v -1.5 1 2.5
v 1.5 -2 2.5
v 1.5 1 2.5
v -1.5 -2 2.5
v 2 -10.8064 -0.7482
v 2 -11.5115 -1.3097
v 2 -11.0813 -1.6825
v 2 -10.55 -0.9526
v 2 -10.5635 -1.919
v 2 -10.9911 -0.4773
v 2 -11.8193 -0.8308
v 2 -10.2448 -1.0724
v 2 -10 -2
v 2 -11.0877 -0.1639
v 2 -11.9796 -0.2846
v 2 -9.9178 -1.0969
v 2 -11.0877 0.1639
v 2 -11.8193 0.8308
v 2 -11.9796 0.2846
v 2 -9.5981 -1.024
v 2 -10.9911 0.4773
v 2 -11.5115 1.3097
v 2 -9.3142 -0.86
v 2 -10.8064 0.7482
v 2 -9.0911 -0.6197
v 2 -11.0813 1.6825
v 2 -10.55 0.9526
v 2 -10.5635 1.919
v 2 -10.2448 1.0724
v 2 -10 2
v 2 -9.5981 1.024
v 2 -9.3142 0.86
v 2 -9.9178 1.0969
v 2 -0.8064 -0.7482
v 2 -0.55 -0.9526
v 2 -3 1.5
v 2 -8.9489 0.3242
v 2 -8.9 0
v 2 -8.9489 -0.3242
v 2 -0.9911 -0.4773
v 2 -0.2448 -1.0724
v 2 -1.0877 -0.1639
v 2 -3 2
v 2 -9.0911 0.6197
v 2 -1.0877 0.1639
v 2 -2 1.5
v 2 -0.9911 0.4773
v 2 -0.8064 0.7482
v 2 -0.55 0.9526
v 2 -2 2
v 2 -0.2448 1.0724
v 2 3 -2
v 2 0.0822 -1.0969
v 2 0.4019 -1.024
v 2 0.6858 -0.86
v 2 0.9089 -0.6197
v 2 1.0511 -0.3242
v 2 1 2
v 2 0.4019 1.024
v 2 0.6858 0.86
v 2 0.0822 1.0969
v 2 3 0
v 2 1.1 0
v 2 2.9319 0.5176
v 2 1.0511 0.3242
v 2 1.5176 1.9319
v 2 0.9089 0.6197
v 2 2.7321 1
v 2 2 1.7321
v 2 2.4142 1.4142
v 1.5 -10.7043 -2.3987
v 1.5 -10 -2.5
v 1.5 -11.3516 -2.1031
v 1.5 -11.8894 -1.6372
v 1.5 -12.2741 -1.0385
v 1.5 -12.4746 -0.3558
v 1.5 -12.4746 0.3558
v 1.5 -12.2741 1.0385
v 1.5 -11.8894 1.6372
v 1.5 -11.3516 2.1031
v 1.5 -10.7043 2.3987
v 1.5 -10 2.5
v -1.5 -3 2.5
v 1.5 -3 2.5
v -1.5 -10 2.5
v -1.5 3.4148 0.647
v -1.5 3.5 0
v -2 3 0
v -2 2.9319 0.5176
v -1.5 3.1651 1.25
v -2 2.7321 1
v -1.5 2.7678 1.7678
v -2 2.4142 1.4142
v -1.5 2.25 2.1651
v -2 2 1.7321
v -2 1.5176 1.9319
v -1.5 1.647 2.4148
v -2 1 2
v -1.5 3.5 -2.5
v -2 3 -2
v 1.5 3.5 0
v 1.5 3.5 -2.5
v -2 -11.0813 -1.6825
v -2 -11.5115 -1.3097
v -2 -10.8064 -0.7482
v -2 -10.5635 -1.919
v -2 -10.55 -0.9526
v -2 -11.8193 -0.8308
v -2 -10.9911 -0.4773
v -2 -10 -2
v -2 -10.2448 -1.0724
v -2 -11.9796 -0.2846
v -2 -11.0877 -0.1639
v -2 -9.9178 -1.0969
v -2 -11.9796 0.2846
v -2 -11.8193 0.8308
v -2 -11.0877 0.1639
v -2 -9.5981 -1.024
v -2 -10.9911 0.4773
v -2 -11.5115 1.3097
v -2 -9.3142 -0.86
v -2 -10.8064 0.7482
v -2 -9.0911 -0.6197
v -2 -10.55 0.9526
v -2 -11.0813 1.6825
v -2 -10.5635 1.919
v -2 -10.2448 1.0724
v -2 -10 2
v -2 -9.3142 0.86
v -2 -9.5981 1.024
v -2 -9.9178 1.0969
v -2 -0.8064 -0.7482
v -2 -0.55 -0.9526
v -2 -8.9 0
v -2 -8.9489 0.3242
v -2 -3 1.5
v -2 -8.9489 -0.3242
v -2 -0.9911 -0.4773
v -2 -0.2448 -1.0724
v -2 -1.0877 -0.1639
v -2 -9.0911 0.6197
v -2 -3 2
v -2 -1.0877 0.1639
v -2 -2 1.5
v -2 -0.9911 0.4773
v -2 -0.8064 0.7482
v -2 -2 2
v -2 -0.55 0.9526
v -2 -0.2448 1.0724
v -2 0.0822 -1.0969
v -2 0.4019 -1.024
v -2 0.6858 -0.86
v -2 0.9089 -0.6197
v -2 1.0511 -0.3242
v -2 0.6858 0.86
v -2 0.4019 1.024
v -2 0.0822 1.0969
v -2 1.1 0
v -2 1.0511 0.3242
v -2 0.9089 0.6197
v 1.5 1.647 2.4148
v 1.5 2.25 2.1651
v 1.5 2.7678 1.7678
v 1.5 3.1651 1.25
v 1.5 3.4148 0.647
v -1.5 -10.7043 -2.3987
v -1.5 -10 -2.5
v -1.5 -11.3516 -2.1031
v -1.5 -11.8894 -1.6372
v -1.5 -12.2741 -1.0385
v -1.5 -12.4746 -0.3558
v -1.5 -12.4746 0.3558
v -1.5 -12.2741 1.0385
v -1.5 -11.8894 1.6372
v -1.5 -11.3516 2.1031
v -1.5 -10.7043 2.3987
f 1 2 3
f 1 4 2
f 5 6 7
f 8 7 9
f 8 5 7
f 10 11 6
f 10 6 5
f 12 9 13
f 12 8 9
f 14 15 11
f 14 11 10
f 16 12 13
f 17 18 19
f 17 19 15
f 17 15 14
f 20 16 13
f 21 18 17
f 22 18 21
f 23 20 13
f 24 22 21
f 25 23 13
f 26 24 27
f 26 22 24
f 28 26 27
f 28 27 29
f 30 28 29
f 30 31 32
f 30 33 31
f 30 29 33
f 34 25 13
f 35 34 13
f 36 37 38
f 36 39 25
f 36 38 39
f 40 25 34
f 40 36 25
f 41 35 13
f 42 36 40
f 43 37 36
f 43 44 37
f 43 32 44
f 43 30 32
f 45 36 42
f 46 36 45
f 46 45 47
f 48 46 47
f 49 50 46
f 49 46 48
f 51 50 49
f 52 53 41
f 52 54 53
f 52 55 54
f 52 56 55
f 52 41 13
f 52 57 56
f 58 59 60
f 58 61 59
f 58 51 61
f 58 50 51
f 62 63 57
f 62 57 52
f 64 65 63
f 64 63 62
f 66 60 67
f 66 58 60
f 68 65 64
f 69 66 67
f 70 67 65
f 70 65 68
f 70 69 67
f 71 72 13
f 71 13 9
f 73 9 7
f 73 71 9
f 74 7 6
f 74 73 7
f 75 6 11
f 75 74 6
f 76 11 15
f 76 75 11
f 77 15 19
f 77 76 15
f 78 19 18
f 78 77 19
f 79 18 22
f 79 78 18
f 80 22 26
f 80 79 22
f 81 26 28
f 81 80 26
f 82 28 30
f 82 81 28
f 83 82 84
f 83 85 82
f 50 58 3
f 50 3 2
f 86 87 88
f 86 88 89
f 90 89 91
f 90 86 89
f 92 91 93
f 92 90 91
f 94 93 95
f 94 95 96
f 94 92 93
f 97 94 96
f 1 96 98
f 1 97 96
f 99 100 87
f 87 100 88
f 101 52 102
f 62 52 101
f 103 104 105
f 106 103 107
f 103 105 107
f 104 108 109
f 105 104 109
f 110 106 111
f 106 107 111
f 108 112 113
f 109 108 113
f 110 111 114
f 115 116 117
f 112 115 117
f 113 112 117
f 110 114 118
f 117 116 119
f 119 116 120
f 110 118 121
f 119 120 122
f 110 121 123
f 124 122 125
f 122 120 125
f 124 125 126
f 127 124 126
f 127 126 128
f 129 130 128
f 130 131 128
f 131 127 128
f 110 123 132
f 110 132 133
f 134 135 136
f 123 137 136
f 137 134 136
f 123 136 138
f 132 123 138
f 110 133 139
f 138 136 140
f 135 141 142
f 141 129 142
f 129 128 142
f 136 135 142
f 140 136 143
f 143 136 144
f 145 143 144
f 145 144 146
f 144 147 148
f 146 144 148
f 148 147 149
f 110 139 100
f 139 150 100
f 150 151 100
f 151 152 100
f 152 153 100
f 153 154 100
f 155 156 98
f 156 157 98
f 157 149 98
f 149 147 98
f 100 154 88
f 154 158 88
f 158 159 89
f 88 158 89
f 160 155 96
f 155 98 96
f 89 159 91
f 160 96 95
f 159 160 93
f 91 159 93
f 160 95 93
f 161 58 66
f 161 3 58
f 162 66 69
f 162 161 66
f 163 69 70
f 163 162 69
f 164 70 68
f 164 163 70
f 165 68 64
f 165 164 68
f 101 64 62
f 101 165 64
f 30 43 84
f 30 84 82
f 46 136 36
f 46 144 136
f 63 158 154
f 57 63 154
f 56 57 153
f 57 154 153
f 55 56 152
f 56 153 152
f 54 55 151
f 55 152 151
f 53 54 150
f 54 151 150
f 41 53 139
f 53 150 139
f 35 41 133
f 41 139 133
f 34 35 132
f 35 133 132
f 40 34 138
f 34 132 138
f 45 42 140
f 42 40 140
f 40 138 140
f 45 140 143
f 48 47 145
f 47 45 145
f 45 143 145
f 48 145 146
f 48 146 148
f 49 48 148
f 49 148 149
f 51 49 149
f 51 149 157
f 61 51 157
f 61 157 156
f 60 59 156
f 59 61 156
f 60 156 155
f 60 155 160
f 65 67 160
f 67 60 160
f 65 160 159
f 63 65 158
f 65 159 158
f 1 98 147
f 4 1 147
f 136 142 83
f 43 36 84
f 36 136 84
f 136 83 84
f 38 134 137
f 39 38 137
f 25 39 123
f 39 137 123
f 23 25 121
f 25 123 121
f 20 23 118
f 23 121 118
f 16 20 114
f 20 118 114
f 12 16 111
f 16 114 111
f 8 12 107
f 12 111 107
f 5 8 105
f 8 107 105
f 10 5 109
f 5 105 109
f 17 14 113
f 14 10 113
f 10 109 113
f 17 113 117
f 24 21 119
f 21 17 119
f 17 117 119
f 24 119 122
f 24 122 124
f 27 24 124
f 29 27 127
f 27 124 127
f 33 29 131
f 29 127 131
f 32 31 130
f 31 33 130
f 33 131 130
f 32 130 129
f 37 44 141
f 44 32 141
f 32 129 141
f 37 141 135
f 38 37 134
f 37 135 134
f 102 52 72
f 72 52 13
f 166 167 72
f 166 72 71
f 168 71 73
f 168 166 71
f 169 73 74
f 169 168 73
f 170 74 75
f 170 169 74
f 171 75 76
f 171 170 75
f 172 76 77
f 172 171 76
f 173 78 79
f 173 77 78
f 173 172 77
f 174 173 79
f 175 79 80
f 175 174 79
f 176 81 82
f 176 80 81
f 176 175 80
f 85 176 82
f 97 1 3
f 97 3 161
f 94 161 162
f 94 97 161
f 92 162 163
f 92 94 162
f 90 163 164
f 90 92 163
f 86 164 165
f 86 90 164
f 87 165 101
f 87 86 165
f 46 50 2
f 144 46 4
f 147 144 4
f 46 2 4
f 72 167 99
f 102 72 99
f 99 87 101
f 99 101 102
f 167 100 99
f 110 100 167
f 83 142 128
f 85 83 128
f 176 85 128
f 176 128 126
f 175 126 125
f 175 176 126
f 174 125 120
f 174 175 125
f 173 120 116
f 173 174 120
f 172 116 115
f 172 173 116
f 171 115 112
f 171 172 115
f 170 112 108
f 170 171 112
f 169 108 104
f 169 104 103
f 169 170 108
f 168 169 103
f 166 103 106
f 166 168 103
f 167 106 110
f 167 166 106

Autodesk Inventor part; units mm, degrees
ref_plane "YZ Plane" through (0, 0, 0) normal (1, 0, 0) x (0, 1, 0)
ref_plane "XZ Plane" through (0, 0, 0) normal (0, 1, 0) x (-1, 0, 0)
ref_plane "XY Plane" through (0, 0, 0) normal (0, 0, 1) x (1, 0, 0)
sketch "Skizze1" plane through (0, 0, 0) normal (1, 0, 0) x (0, 1, 0)
  line L0 (0, 0) -> (-10, 0) construction
  circle A0 centre (0, 0) radius 1.1
  circle A1 centre (-10, 0) radius 1.1
  arc A2 (-10, 2.5) -> (-10, -2.5) centre (-10, 0) ccw
  line L1 (-10, -2.5) -> (3.5, -2.5)
  line L2 (-10, 2.5) -> (1, 2.5)
  arc A3 (3.5, 0) -> (1, 2.5) centre (1, 0) ccw
  line L3 (3.5, 0) -> (3.5, -2.5)
  dimension "d0" = 10
  dimension "d1" = 2.2
  dimension "d2" = 2.2
  dimension "d3" = 2.5
  dimension "d8" = 2.5
  dimension "d9" = 3.5
extrude "Extrusion1" add sketch "Skizze1" along normal mid plane 4
chamfer "Fase1" distance 0.5 angle 45 10 edges at (2, 2.7678, 1.7678) (2, -4.5, 2.5) (2, -12.5, 0) (2, -3.25, -2.5) (2, 3.5, -1.25) (-2, 2.7678, 1.7678) (-2, -4.5, 2.5) (-2, -12.5, 0) (-2, -3.25, -2.5) (-2, 3.5, -1.25)
sketch "Skizze5" plane through (-1.5, -10, 2.5) normal (0, 0, 1) x (1, 0, 0)
  line L0 (1.5, 16.7) -> (1.5, -5.7) projected
  line L1 (-1.3, 10) -> (4.3, 10) projected
  line L2 (3.5, 8) -> (-0.5, 8)
  line L3 (-0.5, 8) -> (-0.5, 7)
  line L4 (-0.5, 7) -> (3.5, 7)
  line L5 (3.5, 7) -> (3.5, 8)
  line L6 (3.5, 0) -> (3.5, 11) projected
  line L7 (-0.5, 11) -> (-0.5, 0) projected
  point P0 (1.5, 10)
  dimension "d26" = 1
  dimension "d27" = 2
extrude "Extrusion4" cut sketch "Skizze5" against normal blind 1 contours L2 L5 L4 L0 | L0 L4 L3 L2
pattern_linear "Rechteckige Anordnung1" [suppressed]
equation "\"d2\" = d1"
properties part number "Chipanschlag TN2"
